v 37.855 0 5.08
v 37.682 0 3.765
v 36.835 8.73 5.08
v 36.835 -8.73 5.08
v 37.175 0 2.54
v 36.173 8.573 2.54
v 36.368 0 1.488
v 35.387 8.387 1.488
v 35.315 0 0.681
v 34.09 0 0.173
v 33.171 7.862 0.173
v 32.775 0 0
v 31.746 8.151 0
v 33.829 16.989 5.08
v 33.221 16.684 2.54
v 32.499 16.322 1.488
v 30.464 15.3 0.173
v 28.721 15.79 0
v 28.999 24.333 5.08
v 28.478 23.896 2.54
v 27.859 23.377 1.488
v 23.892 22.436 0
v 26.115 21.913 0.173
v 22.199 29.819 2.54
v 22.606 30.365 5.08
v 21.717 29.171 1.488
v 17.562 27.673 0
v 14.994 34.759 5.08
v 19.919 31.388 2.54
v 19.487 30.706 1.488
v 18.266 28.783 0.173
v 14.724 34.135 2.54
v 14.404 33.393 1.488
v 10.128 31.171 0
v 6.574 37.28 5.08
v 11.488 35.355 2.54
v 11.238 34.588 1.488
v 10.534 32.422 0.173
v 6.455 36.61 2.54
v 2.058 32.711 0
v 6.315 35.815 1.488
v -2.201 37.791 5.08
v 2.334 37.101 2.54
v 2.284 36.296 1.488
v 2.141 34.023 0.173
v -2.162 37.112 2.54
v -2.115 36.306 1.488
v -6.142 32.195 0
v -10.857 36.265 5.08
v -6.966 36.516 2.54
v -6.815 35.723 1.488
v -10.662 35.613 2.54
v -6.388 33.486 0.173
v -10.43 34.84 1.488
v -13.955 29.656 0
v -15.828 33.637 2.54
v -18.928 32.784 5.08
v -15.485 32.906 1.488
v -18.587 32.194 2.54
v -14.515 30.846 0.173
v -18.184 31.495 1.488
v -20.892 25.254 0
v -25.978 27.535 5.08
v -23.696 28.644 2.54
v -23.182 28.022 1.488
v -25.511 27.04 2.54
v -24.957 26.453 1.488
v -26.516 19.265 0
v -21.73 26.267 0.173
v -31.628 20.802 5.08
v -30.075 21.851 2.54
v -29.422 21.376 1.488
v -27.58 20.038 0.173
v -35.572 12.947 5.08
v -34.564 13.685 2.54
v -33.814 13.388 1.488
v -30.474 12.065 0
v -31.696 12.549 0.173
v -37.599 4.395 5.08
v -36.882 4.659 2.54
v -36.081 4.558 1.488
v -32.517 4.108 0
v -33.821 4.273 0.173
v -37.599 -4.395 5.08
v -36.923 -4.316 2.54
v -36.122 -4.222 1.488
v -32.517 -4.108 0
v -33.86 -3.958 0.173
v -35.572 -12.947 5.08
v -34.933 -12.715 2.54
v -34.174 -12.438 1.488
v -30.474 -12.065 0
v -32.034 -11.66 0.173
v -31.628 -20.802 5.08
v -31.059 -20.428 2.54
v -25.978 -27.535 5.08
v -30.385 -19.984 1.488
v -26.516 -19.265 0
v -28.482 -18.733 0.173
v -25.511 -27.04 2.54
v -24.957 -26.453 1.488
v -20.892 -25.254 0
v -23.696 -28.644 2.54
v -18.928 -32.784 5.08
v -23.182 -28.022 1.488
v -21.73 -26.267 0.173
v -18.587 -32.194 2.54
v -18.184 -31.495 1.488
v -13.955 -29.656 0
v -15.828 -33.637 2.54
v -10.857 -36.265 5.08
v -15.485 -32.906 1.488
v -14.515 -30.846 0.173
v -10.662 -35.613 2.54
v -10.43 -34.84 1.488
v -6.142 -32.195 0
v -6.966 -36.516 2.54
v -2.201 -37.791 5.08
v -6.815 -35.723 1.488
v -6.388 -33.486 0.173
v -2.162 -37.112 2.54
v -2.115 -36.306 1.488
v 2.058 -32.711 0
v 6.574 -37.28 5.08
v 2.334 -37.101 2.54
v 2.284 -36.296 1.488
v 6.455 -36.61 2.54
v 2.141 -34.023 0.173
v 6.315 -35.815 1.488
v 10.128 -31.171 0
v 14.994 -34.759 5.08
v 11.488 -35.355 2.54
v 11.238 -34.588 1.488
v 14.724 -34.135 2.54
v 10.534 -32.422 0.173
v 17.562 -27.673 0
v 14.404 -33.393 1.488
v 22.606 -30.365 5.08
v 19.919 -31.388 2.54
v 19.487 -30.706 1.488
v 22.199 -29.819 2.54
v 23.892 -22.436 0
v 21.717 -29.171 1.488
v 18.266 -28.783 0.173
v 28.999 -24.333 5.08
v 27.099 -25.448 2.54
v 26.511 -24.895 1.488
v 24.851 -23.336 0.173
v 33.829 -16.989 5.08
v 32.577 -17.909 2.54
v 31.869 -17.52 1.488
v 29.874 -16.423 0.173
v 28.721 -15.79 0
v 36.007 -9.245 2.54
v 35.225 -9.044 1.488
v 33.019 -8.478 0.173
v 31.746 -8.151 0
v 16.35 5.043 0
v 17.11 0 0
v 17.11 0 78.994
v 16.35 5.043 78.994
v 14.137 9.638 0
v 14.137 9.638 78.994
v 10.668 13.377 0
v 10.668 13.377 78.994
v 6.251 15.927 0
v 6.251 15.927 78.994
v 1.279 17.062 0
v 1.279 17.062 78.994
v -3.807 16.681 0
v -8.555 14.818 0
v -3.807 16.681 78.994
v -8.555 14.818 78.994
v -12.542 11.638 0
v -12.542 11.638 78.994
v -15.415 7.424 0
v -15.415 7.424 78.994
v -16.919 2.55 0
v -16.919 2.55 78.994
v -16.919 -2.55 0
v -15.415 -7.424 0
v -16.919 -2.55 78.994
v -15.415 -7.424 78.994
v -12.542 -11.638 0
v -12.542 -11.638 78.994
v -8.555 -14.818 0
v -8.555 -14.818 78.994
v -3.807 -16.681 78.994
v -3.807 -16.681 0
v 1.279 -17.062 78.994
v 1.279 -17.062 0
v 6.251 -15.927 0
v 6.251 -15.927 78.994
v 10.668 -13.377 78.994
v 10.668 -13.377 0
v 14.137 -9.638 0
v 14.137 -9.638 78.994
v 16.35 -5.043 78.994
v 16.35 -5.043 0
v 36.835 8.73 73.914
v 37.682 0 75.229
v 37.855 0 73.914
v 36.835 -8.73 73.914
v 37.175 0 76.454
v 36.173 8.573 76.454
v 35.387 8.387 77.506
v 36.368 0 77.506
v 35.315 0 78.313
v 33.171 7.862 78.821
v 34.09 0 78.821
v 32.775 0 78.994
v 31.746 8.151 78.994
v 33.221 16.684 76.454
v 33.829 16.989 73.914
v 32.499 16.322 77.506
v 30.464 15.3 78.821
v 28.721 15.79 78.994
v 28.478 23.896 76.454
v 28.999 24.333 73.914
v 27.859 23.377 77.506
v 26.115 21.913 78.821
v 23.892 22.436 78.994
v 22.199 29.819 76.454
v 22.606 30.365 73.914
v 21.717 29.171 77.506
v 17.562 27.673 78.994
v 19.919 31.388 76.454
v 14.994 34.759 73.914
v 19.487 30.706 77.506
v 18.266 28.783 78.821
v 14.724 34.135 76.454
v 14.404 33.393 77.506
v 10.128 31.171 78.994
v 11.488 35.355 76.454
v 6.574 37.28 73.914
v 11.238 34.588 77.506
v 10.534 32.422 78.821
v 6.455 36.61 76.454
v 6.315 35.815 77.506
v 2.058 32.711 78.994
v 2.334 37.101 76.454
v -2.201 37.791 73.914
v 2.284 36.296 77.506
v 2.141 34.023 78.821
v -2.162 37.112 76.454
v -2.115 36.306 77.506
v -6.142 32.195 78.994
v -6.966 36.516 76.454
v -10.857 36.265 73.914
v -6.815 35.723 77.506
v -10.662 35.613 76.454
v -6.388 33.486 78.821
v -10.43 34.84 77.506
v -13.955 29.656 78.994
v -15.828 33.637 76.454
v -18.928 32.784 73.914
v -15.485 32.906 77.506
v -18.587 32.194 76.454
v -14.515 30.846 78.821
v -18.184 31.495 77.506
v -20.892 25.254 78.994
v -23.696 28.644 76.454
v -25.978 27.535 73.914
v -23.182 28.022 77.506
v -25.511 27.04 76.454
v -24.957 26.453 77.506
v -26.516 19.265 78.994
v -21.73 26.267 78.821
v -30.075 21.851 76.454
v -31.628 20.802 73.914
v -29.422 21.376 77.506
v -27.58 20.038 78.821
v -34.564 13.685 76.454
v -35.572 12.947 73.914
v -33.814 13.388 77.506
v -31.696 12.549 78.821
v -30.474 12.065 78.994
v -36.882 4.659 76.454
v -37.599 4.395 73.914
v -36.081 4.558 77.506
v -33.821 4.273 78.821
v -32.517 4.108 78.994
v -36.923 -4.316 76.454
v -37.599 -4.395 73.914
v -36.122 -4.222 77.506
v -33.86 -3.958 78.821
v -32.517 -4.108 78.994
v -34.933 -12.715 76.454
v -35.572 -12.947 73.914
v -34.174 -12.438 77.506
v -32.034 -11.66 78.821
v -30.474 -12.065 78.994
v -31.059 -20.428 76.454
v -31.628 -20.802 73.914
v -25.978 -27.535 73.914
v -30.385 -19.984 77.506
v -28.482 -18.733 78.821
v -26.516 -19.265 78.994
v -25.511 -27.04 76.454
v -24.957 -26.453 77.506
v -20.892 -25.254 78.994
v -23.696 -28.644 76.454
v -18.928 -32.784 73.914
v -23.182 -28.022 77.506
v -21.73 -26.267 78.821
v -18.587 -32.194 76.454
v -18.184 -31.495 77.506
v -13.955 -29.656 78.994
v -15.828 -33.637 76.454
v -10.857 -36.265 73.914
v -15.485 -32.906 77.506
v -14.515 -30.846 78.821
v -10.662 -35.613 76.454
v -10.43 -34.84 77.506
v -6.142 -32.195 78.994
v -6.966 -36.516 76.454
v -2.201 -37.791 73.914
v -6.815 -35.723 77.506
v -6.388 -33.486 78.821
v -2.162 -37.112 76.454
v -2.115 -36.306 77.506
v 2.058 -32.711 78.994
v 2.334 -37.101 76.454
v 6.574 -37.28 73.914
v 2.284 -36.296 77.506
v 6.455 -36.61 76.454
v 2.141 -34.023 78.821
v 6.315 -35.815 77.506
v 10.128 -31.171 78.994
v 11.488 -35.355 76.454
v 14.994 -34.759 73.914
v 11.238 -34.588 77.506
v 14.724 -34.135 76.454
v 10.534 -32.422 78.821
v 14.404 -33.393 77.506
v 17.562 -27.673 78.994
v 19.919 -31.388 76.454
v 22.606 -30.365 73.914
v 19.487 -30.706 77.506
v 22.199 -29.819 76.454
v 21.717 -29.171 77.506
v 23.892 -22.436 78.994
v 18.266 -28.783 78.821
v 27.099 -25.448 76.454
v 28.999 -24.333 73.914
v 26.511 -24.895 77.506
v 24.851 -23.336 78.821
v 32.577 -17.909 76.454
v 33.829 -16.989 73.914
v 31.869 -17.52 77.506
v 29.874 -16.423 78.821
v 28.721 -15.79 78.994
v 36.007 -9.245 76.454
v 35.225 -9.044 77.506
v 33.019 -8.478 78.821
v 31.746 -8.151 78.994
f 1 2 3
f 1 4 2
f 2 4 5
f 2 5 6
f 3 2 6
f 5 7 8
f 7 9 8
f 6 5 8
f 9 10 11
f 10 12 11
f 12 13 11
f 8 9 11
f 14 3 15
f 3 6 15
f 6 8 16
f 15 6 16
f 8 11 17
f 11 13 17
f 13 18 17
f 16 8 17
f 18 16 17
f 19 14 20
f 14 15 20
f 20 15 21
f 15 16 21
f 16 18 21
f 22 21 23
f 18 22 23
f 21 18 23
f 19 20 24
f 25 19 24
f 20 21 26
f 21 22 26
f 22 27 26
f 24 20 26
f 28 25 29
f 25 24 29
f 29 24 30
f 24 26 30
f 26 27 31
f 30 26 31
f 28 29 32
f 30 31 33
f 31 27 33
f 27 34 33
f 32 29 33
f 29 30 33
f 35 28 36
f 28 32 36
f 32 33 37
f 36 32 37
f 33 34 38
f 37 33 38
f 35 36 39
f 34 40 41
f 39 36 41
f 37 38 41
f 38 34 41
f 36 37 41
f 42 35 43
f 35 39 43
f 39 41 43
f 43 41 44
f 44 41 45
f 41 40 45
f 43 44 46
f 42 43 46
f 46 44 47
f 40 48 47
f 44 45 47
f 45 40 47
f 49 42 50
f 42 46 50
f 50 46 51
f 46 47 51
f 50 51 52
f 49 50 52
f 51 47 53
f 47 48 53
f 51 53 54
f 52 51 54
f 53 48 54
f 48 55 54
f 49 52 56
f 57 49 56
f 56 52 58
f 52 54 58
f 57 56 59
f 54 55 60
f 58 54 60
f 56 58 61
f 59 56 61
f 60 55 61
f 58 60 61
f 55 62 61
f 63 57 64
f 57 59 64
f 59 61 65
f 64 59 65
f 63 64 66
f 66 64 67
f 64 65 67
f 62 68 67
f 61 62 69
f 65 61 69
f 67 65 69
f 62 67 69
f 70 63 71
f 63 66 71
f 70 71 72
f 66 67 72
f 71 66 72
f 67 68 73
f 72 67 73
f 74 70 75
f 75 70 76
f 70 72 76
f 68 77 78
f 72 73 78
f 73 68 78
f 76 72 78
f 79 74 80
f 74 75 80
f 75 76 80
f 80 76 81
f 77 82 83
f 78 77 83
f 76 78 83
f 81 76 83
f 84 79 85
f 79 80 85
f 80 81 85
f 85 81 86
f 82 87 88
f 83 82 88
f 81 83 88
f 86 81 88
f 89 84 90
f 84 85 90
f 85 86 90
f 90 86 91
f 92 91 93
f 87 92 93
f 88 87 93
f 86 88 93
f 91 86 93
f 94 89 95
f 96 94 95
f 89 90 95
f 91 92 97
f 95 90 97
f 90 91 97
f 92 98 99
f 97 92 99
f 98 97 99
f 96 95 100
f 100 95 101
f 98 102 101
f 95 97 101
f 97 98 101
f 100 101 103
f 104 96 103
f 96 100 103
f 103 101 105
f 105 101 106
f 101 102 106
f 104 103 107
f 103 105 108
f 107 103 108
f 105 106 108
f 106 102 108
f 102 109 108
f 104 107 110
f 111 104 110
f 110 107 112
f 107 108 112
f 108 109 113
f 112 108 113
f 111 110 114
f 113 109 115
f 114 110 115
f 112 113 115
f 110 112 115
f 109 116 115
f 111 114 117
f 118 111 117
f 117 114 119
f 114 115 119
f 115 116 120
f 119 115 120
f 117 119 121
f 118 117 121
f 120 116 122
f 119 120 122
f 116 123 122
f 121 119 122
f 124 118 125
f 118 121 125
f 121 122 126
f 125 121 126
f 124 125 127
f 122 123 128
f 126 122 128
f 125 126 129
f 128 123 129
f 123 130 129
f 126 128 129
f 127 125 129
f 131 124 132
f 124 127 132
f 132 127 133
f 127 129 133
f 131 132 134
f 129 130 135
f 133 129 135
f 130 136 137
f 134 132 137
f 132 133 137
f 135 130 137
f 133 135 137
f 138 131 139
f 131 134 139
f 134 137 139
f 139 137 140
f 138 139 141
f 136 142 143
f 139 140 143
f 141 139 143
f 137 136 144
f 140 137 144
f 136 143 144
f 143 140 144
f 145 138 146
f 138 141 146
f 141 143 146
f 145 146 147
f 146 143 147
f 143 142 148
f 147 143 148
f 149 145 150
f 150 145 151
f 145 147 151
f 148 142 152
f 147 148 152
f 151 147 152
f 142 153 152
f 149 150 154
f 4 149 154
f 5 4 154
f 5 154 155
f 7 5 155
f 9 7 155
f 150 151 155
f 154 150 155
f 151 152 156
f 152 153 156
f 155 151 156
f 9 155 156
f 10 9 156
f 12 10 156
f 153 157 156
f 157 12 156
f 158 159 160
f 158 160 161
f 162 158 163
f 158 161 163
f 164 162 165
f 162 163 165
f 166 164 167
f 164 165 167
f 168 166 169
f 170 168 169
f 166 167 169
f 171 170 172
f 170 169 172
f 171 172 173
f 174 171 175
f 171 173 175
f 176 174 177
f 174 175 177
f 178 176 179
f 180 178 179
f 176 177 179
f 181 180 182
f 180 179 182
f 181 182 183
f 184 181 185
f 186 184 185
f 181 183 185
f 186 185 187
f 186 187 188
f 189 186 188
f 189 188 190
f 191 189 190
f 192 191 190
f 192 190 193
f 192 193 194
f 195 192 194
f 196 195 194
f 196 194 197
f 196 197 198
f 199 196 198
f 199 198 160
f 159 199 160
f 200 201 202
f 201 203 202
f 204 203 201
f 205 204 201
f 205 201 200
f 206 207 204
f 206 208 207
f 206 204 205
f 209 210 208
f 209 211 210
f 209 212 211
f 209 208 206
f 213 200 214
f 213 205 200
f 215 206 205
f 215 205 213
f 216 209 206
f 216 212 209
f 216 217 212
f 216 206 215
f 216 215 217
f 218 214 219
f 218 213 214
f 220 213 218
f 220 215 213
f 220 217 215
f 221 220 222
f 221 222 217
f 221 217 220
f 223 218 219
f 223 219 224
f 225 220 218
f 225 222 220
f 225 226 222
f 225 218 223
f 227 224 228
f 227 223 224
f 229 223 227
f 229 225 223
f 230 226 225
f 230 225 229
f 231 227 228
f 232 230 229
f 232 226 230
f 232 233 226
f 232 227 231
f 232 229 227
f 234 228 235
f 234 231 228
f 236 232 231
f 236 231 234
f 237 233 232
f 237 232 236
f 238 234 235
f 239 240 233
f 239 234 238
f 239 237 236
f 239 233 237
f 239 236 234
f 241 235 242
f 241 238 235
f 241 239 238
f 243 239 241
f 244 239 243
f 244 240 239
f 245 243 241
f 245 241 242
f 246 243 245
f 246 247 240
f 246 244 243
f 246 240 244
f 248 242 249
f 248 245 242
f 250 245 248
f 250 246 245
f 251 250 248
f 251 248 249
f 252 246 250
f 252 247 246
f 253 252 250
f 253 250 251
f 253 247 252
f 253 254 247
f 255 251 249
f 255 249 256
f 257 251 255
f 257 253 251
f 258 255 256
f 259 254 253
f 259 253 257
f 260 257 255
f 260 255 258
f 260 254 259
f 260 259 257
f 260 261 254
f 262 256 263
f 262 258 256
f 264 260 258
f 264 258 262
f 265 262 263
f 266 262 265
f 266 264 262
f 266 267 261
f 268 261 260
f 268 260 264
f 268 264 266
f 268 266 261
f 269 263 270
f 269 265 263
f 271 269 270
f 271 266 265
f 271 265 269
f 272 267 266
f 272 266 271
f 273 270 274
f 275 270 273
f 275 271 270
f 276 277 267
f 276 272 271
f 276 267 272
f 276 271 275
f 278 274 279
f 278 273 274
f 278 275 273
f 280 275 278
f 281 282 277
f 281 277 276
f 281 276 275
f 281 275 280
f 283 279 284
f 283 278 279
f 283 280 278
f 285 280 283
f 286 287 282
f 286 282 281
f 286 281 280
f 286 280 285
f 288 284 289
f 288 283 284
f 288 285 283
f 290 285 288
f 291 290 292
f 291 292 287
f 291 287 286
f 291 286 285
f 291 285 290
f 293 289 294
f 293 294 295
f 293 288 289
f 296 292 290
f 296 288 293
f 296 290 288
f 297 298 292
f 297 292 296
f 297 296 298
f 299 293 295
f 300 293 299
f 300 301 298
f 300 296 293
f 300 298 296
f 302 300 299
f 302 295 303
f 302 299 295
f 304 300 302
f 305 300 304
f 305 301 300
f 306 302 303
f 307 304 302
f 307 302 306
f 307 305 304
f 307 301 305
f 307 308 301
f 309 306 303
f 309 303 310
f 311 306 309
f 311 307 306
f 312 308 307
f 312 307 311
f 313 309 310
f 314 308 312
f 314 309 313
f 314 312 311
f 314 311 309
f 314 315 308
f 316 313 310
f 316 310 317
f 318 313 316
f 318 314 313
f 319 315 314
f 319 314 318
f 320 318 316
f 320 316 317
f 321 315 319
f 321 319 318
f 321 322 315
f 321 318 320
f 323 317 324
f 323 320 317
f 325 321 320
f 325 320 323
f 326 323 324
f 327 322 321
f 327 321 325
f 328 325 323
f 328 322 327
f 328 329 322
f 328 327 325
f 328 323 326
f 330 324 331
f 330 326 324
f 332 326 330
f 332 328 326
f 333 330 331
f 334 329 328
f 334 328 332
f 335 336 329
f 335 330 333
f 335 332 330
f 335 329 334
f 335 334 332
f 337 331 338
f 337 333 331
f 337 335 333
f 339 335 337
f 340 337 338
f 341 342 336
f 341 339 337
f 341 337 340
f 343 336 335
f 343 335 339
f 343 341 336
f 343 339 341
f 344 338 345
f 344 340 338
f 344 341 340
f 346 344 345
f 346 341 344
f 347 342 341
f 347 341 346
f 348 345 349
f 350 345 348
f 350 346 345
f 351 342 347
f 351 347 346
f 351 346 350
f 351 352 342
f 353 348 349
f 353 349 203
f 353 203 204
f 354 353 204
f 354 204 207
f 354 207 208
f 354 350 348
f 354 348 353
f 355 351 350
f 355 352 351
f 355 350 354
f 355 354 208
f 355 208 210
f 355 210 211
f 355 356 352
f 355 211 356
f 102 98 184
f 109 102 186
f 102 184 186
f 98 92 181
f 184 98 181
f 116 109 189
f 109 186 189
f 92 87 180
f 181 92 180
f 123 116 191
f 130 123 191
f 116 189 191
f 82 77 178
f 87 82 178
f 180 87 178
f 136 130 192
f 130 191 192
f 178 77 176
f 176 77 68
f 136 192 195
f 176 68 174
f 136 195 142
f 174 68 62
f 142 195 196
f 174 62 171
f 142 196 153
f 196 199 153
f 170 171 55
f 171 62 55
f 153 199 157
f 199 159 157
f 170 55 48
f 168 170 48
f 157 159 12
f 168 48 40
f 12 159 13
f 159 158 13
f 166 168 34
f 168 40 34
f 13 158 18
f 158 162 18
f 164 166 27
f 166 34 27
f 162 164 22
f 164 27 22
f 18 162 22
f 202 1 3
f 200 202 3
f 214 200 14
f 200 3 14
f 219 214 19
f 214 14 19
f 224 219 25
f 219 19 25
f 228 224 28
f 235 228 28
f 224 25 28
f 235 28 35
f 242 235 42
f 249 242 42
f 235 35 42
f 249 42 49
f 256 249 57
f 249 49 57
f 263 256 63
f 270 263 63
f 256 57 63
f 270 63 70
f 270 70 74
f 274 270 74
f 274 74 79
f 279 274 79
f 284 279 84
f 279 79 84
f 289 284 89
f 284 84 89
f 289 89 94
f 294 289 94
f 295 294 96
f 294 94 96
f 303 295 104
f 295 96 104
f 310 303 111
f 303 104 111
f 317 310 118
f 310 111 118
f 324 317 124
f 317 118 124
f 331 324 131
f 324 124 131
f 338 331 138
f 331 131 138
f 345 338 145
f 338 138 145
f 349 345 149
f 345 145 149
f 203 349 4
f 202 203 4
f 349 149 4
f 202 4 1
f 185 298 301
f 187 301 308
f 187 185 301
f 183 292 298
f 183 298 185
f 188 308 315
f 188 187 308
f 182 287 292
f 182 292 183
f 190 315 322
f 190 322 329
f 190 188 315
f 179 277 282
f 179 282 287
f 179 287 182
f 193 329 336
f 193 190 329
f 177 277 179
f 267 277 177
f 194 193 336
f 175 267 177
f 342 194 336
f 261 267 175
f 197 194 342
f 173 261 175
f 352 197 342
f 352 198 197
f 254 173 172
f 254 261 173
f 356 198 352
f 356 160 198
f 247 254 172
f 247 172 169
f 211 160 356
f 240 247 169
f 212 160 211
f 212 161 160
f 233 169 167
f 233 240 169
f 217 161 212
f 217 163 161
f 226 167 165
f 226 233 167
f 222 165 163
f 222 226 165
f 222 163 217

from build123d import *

# Parameters (mm, degrees)
F0_R     = 37.855446
F1_DEPTH = 78.994
F2_R     = 5.08
F3_R     = 17.109797
F4_DEPTH = 118.11


with BuildPart() as f1:
    # F0 (on Top) → F1 (new body)
    with BuildSketch(Plane.XY):
        Circle(F0_R)
    extrude(amount=F1_DEPTH)

    # F2
    f2_edges = [f1.edges().sort_by_distance(p)[0] for p in [
        (37.855446, 0, 39.497),
        (-37.855446, 0, 0),
        (-37.855446, 0, 78.994),
    ]]
    fillet(f2_edges, radius=F2_R)

    # F3 (on face) → F4 (cut)
    with BuildSketch(Plane.XY.offset(78.994)):
        Circle(F3_R)
    extrude(amount=-F4_DEPTH, mode=Mode.SUBTRACT)


solid = f1.part
